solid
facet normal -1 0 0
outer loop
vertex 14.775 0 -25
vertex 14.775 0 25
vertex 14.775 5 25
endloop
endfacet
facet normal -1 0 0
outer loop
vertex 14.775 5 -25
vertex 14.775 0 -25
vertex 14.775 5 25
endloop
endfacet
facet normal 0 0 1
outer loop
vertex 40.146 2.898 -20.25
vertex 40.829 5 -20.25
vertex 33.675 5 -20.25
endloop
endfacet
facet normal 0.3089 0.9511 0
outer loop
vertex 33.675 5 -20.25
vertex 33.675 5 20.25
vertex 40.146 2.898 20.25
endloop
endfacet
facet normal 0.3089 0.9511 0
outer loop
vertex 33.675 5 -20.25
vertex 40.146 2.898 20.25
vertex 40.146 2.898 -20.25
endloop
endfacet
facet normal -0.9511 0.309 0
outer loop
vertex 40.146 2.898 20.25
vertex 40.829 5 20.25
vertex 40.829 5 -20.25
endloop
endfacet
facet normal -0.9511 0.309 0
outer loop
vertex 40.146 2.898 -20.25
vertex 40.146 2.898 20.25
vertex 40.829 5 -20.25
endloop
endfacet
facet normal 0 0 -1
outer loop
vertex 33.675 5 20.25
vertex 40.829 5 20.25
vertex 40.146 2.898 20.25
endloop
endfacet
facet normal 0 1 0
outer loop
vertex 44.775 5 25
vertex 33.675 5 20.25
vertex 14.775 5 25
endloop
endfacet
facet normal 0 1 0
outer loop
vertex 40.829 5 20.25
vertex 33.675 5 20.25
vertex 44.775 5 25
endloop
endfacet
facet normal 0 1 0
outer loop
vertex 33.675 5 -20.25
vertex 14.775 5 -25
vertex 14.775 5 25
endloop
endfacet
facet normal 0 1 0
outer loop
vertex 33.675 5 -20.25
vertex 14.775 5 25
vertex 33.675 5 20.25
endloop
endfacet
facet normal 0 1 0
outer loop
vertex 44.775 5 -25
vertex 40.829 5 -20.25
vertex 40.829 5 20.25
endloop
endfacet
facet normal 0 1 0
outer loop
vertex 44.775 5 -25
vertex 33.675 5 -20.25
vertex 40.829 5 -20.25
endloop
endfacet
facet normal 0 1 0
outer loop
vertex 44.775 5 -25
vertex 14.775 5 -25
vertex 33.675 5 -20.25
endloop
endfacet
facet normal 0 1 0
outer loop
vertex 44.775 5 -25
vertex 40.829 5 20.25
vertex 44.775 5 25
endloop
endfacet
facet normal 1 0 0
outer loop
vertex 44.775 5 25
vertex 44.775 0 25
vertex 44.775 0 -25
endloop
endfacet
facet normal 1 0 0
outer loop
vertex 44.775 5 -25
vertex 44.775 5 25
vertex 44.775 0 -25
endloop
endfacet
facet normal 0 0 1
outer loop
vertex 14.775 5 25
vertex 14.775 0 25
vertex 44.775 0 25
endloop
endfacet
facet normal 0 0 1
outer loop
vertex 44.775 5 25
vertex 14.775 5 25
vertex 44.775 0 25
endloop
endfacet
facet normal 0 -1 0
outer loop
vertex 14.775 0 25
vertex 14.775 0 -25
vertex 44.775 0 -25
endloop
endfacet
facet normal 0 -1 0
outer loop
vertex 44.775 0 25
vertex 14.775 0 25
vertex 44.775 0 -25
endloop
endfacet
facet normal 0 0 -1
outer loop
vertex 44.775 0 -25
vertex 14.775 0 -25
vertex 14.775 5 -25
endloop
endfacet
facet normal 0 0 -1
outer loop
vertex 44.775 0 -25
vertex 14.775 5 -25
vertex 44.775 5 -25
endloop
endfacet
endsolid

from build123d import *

# Parameters (mm, degrees)
SKETCH_1_W          = 89.55
SKETCH_1_H          = 50
EXTRUDE_1_DEPTH     = 5
CUT_EXTRUDE_1_DEPTH = 4
SKETCH_6_W          = 40.5
SKETCH_6_H          = 93
CUT_EXTRUDE_2_DEPTH = 3.43
SKETCH_7_W          = 59.55
SKETCH_7_H          = 5
CUT_EXTRUDE_3_DEPTH = 51


with BuildPart() as part:
    # 草圖1 → 填料-伸長1 (new body)
    with BuildSketch(Plane(origin=(0, 0, 0), x_dir=(1, 0, 0), z_dir=(0, 1, 0))):
        Rectangle(SKETCH_1_W, SKETCH_1_H)
    extrude(amount=EXTRUDE_1_DEPTH)

    # 草圖2 → 除料-伸長1 (cut)
    with BuildSketch(Plane(origin=(0, 5, 0), x_dir=(1, 0, 0), z_dir=(0, 1, 0))):
        Polygon((-39.775, 5.2), (-7.375, 5.2), (-7.375, -5.2), (-39.775, -5.2), (-39.775, -4), (-44.775, -4), (-44.775, 4), (-39.775, 4), align=None)
    extrude(amount=-CUT_EXTRUDE_1_DEPTH, mode=Mode.SUBTRACT)

    # 草圖6 → 除料-伸長2 (cut)
    with BuildSketch(Plane(origin=(5.745095169, 17.681584822, 0), x_dir=(0, 0, -1), z_dir=(0.309016994, 0.951056516, 0))):
        with Locations((0, 9.21448352)):
            Rectangle(SKETCH_6_W, SKETCH_6_H)
    extrude(amount=-CUT_EXTRUDE_2_DEPTH, mode=Mode.SUBTRACT)

    # 草圖7 → 除料-伸長3 (cut, through all)
    with BuildSketch(Plane.XY.offset(25)):
        with Locations((-15, 2.5)):
            Rectangle(SKETCH_7_W, SKETCH_7_H)
    extrude(amount=-CUT_EXTRUDE_3_DEPTH, mode=Mode.SUBTRACT)


solid = part.part
